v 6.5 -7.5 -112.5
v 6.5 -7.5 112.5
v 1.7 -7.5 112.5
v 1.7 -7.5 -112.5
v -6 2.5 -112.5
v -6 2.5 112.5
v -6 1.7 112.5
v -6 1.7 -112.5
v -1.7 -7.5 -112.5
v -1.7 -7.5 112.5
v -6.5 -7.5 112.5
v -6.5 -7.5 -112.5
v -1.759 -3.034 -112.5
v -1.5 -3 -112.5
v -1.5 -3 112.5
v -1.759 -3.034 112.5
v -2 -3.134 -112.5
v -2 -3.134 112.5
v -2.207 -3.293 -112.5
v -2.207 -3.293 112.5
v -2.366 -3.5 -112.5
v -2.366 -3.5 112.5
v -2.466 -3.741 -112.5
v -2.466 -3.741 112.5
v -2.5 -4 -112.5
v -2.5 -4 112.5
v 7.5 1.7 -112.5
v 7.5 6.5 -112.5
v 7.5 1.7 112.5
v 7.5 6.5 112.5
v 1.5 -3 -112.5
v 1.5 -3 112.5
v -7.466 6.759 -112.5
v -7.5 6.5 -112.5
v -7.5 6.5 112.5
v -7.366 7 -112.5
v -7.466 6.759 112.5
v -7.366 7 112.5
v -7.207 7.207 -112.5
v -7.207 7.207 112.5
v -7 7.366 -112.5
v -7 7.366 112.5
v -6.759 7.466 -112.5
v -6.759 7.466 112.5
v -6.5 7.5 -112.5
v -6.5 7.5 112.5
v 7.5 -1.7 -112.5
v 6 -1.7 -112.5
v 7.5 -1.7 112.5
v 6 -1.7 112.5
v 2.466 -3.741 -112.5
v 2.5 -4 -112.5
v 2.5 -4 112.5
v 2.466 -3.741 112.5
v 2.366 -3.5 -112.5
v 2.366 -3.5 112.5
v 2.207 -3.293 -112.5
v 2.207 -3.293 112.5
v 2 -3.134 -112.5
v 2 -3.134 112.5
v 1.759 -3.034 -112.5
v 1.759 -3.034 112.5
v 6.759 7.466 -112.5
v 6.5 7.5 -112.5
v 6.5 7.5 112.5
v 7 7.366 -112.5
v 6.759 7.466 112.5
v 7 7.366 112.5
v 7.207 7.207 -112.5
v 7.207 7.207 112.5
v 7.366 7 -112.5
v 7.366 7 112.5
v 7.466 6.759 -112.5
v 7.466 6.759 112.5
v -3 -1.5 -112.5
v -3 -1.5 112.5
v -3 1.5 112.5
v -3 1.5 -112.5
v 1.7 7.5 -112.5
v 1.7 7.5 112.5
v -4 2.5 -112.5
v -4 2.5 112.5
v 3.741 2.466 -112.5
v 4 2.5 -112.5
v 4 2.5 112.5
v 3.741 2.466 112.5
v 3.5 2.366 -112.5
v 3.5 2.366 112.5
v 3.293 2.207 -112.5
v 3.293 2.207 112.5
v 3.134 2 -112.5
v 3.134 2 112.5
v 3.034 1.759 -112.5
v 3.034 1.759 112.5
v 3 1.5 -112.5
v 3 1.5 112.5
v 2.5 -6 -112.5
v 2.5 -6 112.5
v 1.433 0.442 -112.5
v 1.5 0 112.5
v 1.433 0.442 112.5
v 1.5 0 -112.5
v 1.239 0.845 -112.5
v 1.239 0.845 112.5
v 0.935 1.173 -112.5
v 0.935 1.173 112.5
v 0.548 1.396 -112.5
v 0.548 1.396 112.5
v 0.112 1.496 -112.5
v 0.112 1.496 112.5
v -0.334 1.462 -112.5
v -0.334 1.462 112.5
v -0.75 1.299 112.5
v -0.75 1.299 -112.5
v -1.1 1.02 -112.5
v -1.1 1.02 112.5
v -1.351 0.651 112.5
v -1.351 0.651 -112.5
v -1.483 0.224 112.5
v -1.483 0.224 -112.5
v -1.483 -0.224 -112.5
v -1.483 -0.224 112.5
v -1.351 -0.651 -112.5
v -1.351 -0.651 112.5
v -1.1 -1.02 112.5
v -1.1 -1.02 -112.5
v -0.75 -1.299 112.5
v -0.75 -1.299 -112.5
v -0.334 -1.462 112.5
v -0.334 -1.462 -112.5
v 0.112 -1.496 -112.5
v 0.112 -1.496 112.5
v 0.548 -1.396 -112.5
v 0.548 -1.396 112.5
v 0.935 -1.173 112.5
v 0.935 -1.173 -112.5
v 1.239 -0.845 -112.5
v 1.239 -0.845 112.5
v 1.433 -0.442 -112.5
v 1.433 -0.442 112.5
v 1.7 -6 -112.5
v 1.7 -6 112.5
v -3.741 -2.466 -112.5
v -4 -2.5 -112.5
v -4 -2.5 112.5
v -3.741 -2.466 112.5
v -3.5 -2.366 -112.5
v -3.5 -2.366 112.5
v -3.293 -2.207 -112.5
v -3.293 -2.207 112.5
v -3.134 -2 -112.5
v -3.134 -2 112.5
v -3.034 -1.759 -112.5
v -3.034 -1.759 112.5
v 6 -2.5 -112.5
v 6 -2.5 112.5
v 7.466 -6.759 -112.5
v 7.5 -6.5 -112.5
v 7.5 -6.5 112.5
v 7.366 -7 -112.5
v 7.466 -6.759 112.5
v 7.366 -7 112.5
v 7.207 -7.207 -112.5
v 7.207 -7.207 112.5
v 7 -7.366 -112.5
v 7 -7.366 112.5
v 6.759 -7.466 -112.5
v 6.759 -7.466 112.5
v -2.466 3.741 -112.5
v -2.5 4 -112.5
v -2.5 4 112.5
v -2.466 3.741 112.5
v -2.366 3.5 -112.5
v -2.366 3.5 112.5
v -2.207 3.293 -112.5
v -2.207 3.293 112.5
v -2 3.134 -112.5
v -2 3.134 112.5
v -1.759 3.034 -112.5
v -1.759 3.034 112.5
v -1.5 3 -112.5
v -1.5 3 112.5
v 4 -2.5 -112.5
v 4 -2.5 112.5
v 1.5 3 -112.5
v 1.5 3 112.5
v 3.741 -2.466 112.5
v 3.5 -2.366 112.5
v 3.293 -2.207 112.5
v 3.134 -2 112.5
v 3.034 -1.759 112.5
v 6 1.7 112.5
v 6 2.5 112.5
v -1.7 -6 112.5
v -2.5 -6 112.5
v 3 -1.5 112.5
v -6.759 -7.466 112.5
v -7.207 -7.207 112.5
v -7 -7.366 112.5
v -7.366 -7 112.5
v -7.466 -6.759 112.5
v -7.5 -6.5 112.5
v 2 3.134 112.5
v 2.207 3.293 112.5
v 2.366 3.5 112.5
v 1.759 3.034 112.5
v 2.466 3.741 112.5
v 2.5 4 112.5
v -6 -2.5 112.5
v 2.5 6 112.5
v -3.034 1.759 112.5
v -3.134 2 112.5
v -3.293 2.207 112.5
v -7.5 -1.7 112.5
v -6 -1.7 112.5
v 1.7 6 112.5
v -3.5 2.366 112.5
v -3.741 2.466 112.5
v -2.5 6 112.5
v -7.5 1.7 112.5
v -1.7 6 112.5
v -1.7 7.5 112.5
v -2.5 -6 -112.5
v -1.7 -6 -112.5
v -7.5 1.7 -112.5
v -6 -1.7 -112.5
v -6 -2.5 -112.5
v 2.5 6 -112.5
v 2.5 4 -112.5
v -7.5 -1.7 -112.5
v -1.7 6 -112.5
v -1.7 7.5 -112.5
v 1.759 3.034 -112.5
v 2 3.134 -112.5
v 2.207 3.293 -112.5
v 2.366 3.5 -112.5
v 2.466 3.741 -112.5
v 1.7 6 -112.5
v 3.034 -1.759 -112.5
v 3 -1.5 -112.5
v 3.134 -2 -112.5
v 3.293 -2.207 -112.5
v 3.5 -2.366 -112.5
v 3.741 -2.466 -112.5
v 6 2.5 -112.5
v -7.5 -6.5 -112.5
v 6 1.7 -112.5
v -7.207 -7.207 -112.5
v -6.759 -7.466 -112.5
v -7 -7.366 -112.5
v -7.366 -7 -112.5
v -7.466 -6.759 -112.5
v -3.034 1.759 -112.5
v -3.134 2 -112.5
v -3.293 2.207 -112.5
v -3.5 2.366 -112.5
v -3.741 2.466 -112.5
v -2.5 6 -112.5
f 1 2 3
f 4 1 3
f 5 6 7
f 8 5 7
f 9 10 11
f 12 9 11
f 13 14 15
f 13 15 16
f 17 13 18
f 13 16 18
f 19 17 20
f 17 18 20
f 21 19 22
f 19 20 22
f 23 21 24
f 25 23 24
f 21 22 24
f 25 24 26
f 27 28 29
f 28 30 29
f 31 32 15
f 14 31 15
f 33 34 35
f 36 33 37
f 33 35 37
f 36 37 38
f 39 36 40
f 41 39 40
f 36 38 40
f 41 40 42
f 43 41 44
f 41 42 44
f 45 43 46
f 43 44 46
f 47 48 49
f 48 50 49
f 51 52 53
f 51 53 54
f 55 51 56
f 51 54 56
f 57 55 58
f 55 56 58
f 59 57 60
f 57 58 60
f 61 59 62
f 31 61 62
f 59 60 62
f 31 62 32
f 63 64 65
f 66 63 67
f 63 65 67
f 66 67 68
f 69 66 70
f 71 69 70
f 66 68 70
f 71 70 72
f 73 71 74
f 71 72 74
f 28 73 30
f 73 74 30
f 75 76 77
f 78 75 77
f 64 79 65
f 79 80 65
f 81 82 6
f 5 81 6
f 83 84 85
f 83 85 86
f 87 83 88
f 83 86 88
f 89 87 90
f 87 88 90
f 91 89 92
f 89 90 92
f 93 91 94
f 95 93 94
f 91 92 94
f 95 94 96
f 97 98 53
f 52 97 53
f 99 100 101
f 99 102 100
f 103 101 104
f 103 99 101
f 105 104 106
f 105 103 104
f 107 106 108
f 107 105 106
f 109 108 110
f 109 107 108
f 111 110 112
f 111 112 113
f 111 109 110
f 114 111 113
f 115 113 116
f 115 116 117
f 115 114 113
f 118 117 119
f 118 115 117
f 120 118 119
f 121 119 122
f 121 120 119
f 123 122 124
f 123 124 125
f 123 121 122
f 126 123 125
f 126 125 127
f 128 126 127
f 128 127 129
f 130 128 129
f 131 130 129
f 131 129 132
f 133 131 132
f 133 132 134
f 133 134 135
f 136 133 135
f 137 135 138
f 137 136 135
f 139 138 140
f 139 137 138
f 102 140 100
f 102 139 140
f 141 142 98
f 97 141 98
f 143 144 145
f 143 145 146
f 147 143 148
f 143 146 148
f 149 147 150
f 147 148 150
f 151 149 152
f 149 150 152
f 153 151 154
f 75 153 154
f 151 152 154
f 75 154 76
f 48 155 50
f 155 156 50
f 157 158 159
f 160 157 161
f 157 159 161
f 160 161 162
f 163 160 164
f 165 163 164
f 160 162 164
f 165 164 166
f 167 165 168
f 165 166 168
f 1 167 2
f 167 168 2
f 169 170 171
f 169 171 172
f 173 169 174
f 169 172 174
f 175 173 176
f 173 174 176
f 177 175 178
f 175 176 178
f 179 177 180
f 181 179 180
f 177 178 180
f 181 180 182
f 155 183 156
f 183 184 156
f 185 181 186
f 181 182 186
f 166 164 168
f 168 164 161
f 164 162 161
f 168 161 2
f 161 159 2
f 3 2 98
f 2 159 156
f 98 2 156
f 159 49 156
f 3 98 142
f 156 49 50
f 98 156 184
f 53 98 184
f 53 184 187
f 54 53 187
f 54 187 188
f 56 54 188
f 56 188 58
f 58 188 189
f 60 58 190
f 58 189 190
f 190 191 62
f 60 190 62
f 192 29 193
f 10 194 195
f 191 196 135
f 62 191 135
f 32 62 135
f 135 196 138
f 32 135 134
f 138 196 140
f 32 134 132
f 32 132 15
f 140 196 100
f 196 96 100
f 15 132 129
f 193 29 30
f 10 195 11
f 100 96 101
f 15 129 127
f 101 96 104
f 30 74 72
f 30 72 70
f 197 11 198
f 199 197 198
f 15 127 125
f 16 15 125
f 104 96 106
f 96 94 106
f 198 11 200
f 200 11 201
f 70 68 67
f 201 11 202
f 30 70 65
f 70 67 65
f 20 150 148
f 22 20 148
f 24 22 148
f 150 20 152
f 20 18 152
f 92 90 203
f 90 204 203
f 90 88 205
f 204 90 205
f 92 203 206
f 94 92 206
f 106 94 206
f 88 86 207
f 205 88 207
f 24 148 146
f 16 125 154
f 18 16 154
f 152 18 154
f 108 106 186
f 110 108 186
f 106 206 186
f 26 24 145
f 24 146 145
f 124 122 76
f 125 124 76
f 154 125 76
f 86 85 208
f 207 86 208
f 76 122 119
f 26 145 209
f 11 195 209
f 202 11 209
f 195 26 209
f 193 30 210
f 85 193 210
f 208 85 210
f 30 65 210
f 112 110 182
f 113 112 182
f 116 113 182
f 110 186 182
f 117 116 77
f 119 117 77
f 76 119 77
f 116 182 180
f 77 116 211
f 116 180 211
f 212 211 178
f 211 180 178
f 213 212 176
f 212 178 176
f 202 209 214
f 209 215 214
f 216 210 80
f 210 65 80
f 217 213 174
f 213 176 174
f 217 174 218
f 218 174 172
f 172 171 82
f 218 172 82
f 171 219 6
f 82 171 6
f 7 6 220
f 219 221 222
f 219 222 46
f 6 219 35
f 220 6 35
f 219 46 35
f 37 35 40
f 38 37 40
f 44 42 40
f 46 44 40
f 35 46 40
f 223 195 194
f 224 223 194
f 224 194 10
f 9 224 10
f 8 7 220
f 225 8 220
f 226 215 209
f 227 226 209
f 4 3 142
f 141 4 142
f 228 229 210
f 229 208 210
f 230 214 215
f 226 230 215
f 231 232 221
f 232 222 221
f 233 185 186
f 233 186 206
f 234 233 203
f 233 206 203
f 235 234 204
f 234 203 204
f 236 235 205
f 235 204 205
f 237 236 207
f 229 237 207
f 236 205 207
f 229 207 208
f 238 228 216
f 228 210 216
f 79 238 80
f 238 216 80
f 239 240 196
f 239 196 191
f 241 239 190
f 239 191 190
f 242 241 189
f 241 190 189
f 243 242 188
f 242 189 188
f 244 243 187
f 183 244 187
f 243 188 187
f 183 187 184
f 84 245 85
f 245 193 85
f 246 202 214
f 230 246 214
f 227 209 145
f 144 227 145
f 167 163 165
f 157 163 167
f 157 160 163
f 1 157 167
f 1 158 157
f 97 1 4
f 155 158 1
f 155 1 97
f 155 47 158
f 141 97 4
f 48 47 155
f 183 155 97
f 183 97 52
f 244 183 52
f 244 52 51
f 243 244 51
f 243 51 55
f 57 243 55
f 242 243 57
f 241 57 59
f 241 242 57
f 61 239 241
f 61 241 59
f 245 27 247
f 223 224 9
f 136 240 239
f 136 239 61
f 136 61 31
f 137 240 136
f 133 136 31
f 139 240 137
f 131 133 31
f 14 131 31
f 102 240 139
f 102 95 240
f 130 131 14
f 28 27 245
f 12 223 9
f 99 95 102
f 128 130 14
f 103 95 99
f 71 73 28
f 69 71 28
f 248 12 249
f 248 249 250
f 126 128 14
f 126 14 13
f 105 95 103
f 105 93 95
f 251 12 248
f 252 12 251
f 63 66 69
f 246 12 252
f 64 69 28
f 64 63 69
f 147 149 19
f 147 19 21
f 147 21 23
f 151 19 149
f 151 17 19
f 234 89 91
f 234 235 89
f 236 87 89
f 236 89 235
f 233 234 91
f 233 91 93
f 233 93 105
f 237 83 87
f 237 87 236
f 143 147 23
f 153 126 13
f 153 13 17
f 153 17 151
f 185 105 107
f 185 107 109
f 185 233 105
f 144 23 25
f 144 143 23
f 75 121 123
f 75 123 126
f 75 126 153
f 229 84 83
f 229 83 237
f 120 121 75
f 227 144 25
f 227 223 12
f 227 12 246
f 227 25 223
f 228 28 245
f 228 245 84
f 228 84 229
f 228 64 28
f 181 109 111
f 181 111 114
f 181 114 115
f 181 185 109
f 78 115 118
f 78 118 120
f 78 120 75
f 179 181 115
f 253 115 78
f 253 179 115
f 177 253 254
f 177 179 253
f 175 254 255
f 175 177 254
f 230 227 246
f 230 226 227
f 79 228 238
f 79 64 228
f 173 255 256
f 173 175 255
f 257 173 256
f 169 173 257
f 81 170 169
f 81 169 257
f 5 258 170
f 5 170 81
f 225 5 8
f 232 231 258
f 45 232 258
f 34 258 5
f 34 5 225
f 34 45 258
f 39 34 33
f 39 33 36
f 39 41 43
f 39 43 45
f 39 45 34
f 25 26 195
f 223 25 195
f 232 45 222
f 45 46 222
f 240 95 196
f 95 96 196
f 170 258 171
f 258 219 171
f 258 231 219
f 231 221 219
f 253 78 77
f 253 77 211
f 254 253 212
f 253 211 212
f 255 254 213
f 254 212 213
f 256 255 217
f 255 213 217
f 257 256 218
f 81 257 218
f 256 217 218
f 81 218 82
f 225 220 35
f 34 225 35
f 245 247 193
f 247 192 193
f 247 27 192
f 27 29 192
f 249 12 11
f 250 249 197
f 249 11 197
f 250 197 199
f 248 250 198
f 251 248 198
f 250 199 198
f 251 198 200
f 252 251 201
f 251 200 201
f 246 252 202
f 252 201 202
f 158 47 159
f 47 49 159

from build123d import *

# Parameters (mm, degrees)
SKETCH1_R           = 1.5
BOSS_EXTRUDE1_DEPTH = 112.5


with BuildPart() as part:
    # Sketch1 → Boss-Extrude1 (new, symmetric)
    with BuildSketch(Plane.XY):
        with BuildLine():
            Line((-7.5, 1.7), (-7.5, 6.5))
            ThreePointArc((-7.5, 6.5), (-7.207106781, 7.207106781), (-6.5, 7.5))
            Line((-6.5, 7.5), (-1.7, 7.5))
            Line((-1.7, 7.5), (-1.7, 6))
            Line((-1.7, 6), (-2.5, 6))
            Line((-2.5, 6), (-2.5, 4))
            ThreePointArc((-2.5, 4), (-2.207106781, 3.292893219), (-1.5, 3))
            Line((-1.5, 3), (0, 3))
            Line((0, 3), (1.5, 3))
            ThreePointArc((1.5, 3), (2.207106781, 3.292893219), (2.5, 4))
            Line((2.5, 4), (2.5, 6))
            Line((2.5, 6), (1.7, 6))
            Line((1.7, 6), (1.7, 7.5))
            Line((1.7, 7.5), (6.5, 7.5))
            ThreePointArc((6.5, 7.5), (7.207106781, 7.207106781), (7.5, 6.5))
            Line((7.5, 6.5), (7.5, 1.7))
            Line((7.5, 1.7), (6, 1.7))
            Line((6, 1.7), (6, 2.5))
            Line((6, 2.5), (4, 2.5))
            ThreePointArc((4, 2.5), (3.292893219, 2.207106781), (3, 1.5))
            Line((3, 1.5), (3, 0))
            Line((3, 0), (3, -1.5))
            ThreePointArc((3, -1.5), (3.292893219, -2.207106781), (4, -2.5))
            Line((4, -2.5), (6, -2.5))
            Line((6, -2.5), (6, -1.7))
            Line((6, -1.7), (7.5, -1.7))
            Line((7.5, -1.7), (7.5, -6.5))
            ThreePointArc((7.5, -6.5), (7.207106781, -7.207106781), (6.5, -7.5))
            Line((6.5, -7.5), (1.7, -7.5))
            Line((1.7, -7.5), (1.7, -6))
            Line((1.7, -6), (2.5, -6))
            Line((2.5, -6), (2.5, -4))
            ThreePointArc((2.5, -4), (2.207106781, -3.292893219), (1.5, -3))
            Line((1.5, -3), (0, -3))
            Line((0, -3), (-1.5, -3))
            ThreePointArc((-1.5, -3), (-2.207106781, -3.292893219), (-2.5, -4))
            Line((-2.5, -4), (-2.5, -6))
            Line((-2.5, -6), (-1.7, -6))
            Line((-1.7, -6), (-1.7, -7.5))
            Line((-1.7, -7.5), (-6.5, -7.5))
            ThreePointArc((-6.5, -7.5), (-7.207106781, -7.207106781), (-7.5, -6.5))
            Line((-7.5, -6.5), (-7.5, -1.7))
            Line((-7.5, -1.7), (-6, -1.7))
            Line((-6, -1.7), (-6, -2.5))
            Line((-6, -2.5), (-4, -2.5))
            ThreePointArc((-4, -2.5), (-3.292893219, -2.207106781), (-3, -1.5))
            Line((-3, -1.5), (-3, 0))
            Line((-3, 0), (-3, 1.5))
            ThreePointArc((-3, 1.5), (-3.292893219, 2.207106781), (-4, 2.5))
            Line((-4, 2.5), (-6, 2.5))
            Line((-6, 2.5), (-6, 1.7))
            Line((-6, 1.7), (-7.5, 1.7))
        make_face()
        Circle(SKETCH1_R, mode=Mode.SUBTRACT)
    extrude(amount=BOSS_EXTRUDE1_DEPTH, both=True)


solid = part.part
